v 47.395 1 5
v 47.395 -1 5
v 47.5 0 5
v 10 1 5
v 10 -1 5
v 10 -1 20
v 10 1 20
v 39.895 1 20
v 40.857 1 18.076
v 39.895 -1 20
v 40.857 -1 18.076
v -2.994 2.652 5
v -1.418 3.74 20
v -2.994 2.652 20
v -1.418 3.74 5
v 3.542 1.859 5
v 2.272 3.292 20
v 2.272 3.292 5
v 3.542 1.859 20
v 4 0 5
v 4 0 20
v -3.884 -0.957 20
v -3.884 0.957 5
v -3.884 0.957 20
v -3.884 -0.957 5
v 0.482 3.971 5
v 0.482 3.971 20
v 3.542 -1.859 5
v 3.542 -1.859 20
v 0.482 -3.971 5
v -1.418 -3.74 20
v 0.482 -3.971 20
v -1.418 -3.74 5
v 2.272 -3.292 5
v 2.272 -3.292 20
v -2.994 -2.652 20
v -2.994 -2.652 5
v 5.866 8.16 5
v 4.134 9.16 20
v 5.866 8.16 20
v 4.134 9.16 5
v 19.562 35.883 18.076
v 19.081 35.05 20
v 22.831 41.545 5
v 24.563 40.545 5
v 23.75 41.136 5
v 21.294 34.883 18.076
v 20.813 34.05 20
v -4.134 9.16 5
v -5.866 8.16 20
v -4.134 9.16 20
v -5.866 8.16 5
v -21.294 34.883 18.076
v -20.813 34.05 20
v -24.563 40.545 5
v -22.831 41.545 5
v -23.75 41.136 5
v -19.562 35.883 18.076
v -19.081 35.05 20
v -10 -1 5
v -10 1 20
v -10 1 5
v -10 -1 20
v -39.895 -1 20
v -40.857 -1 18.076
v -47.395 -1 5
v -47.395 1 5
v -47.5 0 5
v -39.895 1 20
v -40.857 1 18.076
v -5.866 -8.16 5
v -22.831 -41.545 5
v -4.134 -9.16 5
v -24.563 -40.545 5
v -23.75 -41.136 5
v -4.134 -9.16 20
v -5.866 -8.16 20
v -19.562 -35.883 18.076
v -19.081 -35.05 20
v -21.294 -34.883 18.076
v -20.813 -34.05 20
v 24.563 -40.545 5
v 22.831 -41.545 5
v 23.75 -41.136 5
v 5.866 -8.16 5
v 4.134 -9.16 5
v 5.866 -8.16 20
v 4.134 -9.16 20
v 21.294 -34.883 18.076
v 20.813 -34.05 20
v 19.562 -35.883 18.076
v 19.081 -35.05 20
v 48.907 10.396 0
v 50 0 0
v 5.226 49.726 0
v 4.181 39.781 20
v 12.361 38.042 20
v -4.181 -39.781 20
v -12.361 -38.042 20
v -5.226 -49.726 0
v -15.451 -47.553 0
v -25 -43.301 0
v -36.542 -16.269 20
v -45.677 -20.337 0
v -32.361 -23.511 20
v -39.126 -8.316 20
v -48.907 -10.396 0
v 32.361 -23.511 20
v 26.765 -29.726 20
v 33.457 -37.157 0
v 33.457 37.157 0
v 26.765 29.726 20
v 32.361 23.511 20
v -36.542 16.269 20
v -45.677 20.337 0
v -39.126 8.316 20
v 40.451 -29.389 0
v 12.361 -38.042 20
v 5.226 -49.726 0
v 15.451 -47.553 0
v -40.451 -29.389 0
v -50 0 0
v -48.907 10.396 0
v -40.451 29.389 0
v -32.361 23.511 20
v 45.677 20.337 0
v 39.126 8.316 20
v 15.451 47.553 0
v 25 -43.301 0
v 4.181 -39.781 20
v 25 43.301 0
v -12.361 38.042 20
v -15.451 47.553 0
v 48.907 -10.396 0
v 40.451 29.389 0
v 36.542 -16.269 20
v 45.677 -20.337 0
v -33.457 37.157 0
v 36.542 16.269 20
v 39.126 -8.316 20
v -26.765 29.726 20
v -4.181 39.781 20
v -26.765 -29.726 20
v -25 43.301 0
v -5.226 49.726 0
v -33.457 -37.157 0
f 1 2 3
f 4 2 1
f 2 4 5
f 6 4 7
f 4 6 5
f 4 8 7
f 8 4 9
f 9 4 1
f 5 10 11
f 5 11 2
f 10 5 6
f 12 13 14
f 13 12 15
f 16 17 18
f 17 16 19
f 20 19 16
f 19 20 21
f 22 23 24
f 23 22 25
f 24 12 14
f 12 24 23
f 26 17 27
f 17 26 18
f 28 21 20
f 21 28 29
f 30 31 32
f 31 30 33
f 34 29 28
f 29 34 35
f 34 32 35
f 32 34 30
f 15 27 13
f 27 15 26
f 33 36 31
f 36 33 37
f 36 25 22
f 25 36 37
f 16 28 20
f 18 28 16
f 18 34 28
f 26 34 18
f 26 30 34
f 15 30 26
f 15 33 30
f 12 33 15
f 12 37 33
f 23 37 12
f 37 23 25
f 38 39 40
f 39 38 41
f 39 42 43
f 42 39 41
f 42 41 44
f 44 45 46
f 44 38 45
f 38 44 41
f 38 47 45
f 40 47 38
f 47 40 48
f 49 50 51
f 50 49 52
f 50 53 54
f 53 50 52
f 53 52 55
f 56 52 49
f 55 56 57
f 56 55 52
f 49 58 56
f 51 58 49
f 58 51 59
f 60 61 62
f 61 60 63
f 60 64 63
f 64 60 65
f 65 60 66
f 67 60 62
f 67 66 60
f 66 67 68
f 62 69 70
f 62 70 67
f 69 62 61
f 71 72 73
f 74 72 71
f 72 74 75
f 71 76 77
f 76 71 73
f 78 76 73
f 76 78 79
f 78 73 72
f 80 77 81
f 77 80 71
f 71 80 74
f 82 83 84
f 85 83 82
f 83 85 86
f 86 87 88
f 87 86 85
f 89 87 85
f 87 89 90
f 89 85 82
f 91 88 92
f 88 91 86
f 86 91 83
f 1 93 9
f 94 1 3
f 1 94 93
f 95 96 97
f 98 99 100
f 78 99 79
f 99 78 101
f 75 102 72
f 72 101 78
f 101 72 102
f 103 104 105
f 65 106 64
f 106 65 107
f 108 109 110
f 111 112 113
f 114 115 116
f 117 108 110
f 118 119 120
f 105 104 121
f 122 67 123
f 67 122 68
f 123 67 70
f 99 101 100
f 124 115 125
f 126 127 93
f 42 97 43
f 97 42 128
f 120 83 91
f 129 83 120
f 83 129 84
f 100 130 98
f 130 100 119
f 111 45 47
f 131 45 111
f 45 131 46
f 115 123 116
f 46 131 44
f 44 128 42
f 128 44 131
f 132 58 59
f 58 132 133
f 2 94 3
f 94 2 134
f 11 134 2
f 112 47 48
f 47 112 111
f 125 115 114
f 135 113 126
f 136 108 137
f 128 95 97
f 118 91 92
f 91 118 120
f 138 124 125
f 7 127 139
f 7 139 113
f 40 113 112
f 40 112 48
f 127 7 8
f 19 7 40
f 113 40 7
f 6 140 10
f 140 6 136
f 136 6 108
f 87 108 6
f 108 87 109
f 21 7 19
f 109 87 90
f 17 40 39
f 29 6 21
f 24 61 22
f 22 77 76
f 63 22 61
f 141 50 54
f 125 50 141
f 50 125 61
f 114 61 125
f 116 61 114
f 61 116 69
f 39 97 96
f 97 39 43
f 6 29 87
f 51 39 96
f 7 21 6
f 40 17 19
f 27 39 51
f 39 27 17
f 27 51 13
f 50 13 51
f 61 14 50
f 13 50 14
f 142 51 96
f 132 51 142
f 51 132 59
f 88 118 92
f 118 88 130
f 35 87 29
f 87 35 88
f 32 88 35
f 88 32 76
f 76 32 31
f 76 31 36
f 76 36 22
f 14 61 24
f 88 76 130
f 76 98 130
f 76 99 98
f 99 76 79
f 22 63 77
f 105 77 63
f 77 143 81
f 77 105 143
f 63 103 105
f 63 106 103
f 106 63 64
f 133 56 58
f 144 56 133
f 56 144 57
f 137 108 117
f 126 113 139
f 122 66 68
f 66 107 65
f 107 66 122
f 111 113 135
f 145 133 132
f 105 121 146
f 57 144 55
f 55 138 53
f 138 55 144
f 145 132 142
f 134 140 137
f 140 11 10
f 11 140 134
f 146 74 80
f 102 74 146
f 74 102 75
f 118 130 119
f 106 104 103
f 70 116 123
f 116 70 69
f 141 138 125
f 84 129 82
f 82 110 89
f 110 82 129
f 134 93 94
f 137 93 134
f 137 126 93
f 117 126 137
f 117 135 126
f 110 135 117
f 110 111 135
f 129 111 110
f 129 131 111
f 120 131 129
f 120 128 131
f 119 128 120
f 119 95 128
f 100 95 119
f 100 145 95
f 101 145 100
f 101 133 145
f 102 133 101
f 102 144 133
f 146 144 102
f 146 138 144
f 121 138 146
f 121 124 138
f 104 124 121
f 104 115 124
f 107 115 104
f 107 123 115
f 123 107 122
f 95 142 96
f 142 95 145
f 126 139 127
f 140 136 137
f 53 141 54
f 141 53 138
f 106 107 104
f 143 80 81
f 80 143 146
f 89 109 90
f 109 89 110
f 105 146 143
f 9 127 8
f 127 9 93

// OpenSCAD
//Number of records slots in base *MAX OF 10*
numRecords=6;
//Smooth Rod Diameter 
rodDiameter=8;

module bottom(){
cylinder(r1=50, r2=40, h=20);

}
module base()
{
if (numRecords>10)
{
echo("Please choose a number less than 10");
}
else{
difference()
{
bottom();
for (x= [0:360/numRecords:360])
{ 
rotate([0,0,x]) translate([30,0,17.5]) cube([40,2,25],center=true);
translate([0,0,5])cylinder(r=rodDiameter/2, h=125);
}
}
}
}

base();
